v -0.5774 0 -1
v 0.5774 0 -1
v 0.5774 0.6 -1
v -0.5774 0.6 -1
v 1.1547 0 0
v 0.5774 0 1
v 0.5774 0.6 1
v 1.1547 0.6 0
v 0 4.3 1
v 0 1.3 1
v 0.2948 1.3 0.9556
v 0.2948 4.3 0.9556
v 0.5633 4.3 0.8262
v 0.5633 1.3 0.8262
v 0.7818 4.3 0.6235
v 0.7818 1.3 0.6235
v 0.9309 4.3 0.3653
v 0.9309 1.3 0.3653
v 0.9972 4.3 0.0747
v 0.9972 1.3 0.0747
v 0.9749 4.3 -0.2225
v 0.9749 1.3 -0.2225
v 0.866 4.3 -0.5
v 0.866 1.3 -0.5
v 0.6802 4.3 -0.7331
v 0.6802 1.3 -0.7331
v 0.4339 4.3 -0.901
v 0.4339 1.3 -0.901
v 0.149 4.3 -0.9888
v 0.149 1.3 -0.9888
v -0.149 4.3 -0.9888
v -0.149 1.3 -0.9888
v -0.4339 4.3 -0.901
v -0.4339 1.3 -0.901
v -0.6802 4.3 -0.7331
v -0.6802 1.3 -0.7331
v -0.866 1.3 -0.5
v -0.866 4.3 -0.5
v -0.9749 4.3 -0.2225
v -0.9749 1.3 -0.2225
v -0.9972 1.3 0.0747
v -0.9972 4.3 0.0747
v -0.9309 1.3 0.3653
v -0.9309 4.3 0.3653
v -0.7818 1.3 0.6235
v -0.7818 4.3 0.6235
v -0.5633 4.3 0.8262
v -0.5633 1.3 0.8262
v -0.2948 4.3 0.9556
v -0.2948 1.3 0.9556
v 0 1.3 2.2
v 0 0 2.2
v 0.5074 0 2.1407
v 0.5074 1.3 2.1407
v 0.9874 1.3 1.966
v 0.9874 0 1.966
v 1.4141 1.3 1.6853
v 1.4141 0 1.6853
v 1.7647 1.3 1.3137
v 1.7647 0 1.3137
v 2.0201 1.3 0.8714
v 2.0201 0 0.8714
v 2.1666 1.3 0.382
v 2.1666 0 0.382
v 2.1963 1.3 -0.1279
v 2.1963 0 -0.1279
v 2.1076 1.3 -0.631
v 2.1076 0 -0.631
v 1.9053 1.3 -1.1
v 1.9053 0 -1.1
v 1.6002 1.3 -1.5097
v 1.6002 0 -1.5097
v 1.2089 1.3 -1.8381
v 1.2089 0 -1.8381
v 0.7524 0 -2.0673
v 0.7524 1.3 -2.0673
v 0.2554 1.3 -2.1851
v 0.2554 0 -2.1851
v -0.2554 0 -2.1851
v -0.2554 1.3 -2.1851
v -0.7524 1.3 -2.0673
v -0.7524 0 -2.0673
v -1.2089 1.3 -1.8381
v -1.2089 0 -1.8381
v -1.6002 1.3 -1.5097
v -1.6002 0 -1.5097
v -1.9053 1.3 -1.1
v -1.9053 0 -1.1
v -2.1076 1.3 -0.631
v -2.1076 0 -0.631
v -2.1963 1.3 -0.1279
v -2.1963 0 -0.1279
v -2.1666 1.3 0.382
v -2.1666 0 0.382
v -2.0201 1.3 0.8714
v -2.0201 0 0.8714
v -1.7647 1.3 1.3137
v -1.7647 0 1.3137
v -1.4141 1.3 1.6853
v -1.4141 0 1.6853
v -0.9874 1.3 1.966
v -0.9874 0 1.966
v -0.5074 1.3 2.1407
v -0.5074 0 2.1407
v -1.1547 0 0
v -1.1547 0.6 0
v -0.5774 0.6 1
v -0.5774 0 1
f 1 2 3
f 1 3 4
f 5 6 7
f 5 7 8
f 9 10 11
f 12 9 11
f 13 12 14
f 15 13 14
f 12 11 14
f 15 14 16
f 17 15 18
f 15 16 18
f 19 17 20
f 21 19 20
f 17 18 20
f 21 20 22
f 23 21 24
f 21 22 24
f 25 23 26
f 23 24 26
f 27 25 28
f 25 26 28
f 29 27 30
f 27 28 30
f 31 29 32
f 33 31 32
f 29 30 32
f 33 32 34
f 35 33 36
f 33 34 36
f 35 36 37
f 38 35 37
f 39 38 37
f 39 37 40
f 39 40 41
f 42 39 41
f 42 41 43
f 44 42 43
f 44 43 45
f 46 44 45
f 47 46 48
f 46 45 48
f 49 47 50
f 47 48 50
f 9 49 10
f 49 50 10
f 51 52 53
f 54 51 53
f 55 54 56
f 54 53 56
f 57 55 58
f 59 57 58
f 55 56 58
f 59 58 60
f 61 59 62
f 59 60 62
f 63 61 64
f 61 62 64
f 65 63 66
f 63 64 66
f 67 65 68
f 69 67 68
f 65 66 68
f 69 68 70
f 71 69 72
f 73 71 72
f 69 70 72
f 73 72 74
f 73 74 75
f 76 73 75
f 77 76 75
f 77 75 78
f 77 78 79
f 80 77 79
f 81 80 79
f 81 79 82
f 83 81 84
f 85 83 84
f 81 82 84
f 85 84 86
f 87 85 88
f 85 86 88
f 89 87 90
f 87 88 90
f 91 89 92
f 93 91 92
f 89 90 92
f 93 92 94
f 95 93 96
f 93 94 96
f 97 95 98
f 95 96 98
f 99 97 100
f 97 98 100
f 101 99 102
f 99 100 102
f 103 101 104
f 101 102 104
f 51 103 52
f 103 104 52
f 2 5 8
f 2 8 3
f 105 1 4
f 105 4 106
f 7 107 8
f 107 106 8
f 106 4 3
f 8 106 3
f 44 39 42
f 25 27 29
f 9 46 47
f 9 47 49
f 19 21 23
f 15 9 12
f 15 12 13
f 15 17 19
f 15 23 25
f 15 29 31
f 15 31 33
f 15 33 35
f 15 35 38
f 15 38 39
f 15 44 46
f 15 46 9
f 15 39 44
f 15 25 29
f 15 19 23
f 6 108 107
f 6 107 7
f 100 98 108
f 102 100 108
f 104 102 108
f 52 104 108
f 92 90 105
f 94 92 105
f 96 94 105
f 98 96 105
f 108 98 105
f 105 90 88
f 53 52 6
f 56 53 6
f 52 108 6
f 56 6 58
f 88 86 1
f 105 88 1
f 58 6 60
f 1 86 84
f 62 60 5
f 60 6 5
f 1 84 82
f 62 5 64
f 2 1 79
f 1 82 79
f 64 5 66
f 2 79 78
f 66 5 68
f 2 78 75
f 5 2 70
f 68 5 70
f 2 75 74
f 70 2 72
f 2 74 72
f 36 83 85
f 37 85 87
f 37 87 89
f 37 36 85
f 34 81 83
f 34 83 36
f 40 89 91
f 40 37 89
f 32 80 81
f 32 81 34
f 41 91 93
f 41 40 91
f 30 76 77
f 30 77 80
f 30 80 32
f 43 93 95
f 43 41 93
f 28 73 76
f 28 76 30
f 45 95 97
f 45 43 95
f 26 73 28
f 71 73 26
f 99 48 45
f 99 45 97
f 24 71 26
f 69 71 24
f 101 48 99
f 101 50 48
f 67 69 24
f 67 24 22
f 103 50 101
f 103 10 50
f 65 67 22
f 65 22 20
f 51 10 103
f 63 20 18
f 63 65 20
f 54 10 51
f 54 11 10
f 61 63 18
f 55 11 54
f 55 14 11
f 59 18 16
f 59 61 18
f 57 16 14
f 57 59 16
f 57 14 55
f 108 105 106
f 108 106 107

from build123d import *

# Parameters (mm, degrees)
SKETCH_1_R          = 2.2
EXTRUDE_1_DEPTH     = 1.3
CUT_EXTRUDE_1_DEPTH = 0.6
SKETCH_2_R          = 1
EXTRUDE_2_DEPTH     = 3


with BuildPart() as part:
    # 草图1 → 凸台-拉伸1 (new body)
    with BuildSketch(Plane(origin=(0, 0, 0), x_dir=(1, 0, 0), z_dir=(0, 1, 0))):
        Circle(SKETCH_1_R)
    extrude(amount=EXTRUDE_1_DEPTH)

    # 草图1<3> → 切除-拉伸1 (cut)
    with BuildSketch(Plane(origin=(0, 0, 0), x_dir=(1, 0, 0), z_dir=(0, 1, 0))):
        Polygon((0.577350269, -1), (1.154700538, 0), (0.577350269, 1), (-0.577350269, 1), (-1.154700538, 0), (-0.577350269, -1), align=None)
    extrude(amount=CUT_EXTRUDE_1_DEPTH, mode=Mode.SUBTRACT)

    # 草图2 → 凸台-拉伸2 (add)
    with BuildSketch(Plane(origin=(0, 1.3, 0), x_dir=(1, 0, 0), z_dir=(0, 1, 0))):
        Circle(SKETCH_2_R)
    extrude(amount=EXTRUDE_2_DEPTH)


solid = part.part
